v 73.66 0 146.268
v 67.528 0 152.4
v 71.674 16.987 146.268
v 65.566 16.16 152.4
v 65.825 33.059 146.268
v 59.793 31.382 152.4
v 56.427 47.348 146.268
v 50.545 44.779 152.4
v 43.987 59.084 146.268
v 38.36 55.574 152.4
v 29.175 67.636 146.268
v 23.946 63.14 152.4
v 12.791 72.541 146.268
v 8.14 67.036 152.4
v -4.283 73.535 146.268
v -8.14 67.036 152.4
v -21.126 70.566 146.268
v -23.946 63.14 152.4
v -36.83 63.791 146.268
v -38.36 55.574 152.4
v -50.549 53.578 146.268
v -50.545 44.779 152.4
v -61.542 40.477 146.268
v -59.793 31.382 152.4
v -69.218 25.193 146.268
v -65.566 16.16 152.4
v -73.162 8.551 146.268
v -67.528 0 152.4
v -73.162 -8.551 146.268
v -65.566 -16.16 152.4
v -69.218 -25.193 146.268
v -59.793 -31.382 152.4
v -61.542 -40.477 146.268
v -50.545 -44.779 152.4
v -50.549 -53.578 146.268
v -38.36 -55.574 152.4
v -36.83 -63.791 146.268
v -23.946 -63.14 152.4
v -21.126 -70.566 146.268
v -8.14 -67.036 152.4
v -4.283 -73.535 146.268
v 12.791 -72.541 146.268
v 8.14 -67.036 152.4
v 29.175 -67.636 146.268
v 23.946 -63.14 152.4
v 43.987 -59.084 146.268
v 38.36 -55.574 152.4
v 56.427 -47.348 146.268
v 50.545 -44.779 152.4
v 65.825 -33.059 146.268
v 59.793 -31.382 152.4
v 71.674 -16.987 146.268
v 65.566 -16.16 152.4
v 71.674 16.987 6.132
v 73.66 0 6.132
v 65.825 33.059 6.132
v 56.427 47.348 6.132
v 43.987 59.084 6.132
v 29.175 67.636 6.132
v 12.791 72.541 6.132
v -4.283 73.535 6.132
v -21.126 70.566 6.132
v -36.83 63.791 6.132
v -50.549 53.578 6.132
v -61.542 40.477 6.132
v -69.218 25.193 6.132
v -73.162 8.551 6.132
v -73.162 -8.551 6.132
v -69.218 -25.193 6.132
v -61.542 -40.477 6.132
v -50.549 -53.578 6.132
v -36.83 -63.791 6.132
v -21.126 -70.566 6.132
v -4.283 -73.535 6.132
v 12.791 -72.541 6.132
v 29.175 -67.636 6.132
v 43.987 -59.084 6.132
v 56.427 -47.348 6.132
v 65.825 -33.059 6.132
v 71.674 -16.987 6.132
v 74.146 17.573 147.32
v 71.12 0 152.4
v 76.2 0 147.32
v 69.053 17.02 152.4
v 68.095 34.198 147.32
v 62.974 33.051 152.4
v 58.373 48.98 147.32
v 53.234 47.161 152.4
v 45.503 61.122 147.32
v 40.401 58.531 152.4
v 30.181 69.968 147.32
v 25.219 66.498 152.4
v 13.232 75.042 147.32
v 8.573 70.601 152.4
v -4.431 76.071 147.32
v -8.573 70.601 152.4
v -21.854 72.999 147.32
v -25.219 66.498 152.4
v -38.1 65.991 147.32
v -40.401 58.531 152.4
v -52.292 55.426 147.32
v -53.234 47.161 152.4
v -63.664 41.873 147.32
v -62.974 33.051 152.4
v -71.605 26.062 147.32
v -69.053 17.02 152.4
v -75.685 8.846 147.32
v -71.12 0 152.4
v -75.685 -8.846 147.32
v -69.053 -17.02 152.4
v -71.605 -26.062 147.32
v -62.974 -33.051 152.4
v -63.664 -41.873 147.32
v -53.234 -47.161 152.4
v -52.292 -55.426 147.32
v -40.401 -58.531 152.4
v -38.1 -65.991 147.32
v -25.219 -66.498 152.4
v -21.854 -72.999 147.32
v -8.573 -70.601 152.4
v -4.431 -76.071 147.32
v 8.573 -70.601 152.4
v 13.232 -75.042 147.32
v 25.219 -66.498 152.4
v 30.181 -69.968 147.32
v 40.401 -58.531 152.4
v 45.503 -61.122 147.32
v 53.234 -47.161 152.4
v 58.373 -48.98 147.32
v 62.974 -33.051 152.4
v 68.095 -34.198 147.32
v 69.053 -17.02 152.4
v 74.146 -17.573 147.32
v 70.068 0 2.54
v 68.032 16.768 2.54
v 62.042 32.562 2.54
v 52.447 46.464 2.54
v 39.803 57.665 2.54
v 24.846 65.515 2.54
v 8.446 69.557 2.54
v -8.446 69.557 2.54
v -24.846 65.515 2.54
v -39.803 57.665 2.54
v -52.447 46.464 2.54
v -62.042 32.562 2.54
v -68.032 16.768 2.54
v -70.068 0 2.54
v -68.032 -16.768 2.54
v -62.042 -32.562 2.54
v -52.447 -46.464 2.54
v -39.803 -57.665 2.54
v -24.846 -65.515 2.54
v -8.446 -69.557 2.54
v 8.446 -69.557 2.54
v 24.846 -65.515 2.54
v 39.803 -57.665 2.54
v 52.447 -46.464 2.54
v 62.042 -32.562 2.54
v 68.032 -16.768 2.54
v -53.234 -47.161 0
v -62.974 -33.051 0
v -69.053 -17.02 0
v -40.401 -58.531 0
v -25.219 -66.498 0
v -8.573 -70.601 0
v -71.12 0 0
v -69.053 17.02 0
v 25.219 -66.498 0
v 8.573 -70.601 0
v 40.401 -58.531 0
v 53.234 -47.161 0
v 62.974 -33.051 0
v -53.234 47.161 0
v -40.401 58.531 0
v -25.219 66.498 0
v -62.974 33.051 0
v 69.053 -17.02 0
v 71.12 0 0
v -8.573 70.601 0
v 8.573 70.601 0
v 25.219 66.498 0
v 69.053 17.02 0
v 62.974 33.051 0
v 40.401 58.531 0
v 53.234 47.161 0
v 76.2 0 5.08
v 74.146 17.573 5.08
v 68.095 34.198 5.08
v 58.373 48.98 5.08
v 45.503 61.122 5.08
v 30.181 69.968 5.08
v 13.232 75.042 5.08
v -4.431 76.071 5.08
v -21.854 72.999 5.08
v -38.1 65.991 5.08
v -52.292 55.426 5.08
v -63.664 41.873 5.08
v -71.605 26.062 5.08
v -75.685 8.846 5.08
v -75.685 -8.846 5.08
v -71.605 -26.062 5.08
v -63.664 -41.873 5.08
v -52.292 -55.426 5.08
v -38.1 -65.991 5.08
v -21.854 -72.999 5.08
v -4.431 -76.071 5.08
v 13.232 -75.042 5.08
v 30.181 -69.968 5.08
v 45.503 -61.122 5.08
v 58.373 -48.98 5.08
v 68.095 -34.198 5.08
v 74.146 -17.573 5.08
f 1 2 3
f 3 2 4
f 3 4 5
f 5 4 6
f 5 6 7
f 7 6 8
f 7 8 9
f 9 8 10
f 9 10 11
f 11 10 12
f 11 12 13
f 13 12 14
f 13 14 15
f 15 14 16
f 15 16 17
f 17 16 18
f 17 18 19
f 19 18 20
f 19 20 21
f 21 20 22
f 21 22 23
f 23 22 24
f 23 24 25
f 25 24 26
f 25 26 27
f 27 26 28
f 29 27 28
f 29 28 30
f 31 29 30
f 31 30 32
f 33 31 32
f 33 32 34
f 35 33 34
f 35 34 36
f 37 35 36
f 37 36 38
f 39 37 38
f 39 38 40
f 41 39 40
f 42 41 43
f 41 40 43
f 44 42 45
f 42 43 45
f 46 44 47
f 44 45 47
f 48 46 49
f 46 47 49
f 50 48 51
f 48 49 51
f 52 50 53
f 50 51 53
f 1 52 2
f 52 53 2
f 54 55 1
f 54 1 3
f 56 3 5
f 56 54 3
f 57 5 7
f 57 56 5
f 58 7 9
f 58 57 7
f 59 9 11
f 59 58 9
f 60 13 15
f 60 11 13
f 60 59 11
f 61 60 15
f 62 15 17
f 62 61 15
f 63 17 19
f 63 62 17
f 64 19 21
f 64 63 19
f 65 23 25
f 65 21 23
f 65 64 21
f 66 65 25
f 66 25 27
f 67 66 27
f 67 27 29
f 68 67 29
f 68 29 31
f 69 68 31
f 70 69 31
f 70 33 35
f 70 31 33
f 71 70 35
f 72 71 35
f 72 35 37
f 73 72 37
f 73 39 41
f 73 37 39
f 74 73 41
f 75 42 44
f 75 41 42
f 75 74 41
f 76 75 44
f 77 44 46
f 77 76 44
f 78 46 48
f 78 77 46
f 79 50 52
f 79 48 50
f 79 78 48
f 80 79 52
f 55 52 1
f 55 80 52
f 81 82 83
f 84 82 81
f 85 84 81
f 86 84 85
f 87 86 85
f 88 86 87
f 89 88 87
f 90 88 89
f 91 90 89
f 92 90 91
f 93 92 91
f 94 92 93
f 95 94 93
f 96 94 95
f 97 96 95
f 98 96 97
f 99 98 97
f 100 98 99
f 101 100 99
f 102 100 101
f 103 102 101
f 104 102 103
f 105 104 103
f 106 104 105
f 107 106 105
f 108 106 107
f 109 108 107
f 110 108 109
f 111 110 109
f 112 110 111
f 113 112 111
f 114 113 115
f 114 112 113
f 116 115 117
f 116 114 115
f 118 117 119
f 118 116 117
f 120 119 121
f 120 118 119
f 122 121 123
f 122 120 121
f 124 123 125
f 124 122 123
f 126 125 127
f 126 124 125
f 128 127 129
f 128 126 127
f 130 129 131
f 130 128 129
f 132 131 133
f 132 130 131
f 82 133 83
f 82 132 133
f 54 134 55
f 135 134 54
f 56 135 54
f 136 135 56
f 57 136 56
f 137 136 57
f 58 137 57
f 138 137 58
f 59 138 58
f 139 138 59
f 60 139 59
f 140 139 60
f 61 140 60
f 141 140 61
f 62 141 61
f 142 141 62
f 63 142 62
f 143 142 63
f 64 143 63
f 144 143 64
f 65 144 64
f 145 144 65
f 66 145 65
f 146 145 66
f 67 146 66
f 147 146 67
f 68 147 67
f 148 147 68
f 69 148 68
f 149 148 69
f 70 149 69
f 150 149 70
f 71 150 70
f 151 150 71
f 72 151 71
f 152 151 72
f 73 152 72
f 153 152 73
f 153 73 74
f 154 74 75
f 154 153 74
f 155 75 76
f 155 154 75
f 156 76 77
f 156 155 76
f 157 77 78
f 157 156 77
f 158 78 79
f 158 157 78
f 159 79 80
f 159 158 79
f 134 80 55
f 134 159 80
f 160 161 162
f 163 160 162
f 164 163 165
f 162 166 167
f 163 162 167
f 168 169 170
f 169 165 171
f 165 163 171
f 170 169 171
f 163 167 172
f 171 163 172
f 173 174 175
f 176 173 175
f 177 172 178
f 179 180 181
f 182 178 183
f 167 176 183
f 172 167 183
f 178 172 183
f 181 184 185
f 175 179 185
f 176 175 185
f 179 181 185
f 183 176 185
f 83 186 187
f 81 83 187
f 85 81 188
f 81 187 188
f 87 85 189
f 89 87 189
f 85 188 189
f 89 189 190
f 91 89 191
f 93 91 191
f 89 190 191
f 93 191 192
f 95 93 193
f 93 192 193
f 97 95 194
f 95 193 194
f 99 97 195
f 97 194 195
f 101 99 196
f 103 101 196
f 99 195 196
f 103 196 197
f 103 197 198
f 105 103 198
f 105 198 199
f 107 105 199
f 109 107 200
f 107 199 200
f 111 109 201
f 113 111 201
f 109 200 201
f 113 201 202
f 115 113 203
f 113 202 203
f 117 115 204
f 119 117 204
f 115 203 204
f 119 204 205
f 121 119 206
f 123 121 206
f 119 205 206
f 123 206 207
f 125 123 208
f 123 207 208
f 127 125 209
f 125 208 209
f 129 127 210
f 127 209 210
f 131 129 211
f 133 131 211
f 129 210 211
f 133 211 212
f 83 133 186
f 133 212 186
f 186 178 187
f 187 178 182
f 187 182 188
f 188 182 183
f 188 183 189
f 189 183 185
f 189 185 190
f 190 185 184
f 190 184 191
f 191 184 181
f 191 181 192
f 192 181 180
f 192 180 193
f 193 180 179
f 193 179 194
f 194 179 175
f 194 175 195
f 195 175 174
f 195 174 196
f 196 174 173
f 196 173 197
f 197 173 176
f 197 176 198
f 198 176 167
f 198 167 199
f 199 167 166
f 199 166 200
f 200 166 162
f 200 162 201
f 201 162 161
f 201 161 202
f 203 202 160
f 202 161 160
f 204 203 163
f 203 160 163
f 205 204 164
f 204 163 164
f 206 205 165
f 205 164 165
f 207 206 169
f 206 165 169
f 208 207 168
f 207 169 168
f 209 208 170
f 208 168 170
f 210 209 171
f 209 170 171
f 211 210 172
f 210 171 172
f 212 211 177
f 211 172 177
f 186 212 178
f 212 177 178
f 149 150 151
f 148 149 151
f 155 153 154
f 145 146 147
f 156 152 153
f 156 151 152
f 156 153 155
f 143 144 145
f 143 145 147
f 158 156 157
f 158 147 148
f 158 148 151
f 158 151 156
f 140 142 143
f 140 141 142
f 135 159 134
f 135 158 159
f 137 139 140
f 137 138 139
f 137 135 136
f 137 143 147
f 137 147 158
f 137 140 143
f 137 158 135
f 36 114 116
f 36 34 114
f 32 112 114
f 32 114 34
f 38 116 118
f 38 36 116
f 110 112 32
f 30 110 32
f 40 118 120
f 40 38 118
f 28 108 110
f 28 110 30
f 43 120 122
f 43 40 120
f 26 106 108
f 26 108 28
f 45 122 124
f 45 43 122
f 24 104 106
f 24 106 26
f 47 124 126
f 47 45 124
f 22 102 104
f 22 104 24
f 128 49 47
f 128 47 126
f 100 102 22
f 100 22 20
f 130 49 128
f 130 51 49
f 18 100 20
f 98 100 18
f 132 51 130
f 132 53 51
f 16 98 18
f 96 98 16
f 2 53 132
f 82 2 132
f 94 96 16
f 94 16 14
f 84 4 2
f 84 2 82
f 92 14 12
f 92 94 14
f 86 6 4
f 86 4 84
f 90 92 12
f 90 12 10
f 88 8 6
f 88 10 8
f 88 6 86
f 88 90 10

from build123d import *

# Parameters (mm, degrees)
F0_R     = 76.2
F1_DEPTH = 152.4
F2_SIZE  = 5.08
F3_T     = -2.54


with BuildPart() as f1:
    # F0 (on Top) → F1 (new body)
    with BuildSketch(Plane.XY):
        Circle(F0_R)
    extrude(amount=F1_DEPTH)

    # F2
    f2_edges = [f1.edges().sort_by_distance(p)[0] for p in [
        (-76.2, 0, 152.4),
        (76.2, 0, 76.2),
        (-76.2, 0, 0),
    ]]
    chamfer(f2_edges, length=F2_SIZE)

    # F3
    f3_openings = [f1.faces().sort_by_distance(p)[0] for p in [
        (0, 0, 152.4),
    ]]
    offset(amount=F3_T, openings=f3_openings)


solid = f1.part
